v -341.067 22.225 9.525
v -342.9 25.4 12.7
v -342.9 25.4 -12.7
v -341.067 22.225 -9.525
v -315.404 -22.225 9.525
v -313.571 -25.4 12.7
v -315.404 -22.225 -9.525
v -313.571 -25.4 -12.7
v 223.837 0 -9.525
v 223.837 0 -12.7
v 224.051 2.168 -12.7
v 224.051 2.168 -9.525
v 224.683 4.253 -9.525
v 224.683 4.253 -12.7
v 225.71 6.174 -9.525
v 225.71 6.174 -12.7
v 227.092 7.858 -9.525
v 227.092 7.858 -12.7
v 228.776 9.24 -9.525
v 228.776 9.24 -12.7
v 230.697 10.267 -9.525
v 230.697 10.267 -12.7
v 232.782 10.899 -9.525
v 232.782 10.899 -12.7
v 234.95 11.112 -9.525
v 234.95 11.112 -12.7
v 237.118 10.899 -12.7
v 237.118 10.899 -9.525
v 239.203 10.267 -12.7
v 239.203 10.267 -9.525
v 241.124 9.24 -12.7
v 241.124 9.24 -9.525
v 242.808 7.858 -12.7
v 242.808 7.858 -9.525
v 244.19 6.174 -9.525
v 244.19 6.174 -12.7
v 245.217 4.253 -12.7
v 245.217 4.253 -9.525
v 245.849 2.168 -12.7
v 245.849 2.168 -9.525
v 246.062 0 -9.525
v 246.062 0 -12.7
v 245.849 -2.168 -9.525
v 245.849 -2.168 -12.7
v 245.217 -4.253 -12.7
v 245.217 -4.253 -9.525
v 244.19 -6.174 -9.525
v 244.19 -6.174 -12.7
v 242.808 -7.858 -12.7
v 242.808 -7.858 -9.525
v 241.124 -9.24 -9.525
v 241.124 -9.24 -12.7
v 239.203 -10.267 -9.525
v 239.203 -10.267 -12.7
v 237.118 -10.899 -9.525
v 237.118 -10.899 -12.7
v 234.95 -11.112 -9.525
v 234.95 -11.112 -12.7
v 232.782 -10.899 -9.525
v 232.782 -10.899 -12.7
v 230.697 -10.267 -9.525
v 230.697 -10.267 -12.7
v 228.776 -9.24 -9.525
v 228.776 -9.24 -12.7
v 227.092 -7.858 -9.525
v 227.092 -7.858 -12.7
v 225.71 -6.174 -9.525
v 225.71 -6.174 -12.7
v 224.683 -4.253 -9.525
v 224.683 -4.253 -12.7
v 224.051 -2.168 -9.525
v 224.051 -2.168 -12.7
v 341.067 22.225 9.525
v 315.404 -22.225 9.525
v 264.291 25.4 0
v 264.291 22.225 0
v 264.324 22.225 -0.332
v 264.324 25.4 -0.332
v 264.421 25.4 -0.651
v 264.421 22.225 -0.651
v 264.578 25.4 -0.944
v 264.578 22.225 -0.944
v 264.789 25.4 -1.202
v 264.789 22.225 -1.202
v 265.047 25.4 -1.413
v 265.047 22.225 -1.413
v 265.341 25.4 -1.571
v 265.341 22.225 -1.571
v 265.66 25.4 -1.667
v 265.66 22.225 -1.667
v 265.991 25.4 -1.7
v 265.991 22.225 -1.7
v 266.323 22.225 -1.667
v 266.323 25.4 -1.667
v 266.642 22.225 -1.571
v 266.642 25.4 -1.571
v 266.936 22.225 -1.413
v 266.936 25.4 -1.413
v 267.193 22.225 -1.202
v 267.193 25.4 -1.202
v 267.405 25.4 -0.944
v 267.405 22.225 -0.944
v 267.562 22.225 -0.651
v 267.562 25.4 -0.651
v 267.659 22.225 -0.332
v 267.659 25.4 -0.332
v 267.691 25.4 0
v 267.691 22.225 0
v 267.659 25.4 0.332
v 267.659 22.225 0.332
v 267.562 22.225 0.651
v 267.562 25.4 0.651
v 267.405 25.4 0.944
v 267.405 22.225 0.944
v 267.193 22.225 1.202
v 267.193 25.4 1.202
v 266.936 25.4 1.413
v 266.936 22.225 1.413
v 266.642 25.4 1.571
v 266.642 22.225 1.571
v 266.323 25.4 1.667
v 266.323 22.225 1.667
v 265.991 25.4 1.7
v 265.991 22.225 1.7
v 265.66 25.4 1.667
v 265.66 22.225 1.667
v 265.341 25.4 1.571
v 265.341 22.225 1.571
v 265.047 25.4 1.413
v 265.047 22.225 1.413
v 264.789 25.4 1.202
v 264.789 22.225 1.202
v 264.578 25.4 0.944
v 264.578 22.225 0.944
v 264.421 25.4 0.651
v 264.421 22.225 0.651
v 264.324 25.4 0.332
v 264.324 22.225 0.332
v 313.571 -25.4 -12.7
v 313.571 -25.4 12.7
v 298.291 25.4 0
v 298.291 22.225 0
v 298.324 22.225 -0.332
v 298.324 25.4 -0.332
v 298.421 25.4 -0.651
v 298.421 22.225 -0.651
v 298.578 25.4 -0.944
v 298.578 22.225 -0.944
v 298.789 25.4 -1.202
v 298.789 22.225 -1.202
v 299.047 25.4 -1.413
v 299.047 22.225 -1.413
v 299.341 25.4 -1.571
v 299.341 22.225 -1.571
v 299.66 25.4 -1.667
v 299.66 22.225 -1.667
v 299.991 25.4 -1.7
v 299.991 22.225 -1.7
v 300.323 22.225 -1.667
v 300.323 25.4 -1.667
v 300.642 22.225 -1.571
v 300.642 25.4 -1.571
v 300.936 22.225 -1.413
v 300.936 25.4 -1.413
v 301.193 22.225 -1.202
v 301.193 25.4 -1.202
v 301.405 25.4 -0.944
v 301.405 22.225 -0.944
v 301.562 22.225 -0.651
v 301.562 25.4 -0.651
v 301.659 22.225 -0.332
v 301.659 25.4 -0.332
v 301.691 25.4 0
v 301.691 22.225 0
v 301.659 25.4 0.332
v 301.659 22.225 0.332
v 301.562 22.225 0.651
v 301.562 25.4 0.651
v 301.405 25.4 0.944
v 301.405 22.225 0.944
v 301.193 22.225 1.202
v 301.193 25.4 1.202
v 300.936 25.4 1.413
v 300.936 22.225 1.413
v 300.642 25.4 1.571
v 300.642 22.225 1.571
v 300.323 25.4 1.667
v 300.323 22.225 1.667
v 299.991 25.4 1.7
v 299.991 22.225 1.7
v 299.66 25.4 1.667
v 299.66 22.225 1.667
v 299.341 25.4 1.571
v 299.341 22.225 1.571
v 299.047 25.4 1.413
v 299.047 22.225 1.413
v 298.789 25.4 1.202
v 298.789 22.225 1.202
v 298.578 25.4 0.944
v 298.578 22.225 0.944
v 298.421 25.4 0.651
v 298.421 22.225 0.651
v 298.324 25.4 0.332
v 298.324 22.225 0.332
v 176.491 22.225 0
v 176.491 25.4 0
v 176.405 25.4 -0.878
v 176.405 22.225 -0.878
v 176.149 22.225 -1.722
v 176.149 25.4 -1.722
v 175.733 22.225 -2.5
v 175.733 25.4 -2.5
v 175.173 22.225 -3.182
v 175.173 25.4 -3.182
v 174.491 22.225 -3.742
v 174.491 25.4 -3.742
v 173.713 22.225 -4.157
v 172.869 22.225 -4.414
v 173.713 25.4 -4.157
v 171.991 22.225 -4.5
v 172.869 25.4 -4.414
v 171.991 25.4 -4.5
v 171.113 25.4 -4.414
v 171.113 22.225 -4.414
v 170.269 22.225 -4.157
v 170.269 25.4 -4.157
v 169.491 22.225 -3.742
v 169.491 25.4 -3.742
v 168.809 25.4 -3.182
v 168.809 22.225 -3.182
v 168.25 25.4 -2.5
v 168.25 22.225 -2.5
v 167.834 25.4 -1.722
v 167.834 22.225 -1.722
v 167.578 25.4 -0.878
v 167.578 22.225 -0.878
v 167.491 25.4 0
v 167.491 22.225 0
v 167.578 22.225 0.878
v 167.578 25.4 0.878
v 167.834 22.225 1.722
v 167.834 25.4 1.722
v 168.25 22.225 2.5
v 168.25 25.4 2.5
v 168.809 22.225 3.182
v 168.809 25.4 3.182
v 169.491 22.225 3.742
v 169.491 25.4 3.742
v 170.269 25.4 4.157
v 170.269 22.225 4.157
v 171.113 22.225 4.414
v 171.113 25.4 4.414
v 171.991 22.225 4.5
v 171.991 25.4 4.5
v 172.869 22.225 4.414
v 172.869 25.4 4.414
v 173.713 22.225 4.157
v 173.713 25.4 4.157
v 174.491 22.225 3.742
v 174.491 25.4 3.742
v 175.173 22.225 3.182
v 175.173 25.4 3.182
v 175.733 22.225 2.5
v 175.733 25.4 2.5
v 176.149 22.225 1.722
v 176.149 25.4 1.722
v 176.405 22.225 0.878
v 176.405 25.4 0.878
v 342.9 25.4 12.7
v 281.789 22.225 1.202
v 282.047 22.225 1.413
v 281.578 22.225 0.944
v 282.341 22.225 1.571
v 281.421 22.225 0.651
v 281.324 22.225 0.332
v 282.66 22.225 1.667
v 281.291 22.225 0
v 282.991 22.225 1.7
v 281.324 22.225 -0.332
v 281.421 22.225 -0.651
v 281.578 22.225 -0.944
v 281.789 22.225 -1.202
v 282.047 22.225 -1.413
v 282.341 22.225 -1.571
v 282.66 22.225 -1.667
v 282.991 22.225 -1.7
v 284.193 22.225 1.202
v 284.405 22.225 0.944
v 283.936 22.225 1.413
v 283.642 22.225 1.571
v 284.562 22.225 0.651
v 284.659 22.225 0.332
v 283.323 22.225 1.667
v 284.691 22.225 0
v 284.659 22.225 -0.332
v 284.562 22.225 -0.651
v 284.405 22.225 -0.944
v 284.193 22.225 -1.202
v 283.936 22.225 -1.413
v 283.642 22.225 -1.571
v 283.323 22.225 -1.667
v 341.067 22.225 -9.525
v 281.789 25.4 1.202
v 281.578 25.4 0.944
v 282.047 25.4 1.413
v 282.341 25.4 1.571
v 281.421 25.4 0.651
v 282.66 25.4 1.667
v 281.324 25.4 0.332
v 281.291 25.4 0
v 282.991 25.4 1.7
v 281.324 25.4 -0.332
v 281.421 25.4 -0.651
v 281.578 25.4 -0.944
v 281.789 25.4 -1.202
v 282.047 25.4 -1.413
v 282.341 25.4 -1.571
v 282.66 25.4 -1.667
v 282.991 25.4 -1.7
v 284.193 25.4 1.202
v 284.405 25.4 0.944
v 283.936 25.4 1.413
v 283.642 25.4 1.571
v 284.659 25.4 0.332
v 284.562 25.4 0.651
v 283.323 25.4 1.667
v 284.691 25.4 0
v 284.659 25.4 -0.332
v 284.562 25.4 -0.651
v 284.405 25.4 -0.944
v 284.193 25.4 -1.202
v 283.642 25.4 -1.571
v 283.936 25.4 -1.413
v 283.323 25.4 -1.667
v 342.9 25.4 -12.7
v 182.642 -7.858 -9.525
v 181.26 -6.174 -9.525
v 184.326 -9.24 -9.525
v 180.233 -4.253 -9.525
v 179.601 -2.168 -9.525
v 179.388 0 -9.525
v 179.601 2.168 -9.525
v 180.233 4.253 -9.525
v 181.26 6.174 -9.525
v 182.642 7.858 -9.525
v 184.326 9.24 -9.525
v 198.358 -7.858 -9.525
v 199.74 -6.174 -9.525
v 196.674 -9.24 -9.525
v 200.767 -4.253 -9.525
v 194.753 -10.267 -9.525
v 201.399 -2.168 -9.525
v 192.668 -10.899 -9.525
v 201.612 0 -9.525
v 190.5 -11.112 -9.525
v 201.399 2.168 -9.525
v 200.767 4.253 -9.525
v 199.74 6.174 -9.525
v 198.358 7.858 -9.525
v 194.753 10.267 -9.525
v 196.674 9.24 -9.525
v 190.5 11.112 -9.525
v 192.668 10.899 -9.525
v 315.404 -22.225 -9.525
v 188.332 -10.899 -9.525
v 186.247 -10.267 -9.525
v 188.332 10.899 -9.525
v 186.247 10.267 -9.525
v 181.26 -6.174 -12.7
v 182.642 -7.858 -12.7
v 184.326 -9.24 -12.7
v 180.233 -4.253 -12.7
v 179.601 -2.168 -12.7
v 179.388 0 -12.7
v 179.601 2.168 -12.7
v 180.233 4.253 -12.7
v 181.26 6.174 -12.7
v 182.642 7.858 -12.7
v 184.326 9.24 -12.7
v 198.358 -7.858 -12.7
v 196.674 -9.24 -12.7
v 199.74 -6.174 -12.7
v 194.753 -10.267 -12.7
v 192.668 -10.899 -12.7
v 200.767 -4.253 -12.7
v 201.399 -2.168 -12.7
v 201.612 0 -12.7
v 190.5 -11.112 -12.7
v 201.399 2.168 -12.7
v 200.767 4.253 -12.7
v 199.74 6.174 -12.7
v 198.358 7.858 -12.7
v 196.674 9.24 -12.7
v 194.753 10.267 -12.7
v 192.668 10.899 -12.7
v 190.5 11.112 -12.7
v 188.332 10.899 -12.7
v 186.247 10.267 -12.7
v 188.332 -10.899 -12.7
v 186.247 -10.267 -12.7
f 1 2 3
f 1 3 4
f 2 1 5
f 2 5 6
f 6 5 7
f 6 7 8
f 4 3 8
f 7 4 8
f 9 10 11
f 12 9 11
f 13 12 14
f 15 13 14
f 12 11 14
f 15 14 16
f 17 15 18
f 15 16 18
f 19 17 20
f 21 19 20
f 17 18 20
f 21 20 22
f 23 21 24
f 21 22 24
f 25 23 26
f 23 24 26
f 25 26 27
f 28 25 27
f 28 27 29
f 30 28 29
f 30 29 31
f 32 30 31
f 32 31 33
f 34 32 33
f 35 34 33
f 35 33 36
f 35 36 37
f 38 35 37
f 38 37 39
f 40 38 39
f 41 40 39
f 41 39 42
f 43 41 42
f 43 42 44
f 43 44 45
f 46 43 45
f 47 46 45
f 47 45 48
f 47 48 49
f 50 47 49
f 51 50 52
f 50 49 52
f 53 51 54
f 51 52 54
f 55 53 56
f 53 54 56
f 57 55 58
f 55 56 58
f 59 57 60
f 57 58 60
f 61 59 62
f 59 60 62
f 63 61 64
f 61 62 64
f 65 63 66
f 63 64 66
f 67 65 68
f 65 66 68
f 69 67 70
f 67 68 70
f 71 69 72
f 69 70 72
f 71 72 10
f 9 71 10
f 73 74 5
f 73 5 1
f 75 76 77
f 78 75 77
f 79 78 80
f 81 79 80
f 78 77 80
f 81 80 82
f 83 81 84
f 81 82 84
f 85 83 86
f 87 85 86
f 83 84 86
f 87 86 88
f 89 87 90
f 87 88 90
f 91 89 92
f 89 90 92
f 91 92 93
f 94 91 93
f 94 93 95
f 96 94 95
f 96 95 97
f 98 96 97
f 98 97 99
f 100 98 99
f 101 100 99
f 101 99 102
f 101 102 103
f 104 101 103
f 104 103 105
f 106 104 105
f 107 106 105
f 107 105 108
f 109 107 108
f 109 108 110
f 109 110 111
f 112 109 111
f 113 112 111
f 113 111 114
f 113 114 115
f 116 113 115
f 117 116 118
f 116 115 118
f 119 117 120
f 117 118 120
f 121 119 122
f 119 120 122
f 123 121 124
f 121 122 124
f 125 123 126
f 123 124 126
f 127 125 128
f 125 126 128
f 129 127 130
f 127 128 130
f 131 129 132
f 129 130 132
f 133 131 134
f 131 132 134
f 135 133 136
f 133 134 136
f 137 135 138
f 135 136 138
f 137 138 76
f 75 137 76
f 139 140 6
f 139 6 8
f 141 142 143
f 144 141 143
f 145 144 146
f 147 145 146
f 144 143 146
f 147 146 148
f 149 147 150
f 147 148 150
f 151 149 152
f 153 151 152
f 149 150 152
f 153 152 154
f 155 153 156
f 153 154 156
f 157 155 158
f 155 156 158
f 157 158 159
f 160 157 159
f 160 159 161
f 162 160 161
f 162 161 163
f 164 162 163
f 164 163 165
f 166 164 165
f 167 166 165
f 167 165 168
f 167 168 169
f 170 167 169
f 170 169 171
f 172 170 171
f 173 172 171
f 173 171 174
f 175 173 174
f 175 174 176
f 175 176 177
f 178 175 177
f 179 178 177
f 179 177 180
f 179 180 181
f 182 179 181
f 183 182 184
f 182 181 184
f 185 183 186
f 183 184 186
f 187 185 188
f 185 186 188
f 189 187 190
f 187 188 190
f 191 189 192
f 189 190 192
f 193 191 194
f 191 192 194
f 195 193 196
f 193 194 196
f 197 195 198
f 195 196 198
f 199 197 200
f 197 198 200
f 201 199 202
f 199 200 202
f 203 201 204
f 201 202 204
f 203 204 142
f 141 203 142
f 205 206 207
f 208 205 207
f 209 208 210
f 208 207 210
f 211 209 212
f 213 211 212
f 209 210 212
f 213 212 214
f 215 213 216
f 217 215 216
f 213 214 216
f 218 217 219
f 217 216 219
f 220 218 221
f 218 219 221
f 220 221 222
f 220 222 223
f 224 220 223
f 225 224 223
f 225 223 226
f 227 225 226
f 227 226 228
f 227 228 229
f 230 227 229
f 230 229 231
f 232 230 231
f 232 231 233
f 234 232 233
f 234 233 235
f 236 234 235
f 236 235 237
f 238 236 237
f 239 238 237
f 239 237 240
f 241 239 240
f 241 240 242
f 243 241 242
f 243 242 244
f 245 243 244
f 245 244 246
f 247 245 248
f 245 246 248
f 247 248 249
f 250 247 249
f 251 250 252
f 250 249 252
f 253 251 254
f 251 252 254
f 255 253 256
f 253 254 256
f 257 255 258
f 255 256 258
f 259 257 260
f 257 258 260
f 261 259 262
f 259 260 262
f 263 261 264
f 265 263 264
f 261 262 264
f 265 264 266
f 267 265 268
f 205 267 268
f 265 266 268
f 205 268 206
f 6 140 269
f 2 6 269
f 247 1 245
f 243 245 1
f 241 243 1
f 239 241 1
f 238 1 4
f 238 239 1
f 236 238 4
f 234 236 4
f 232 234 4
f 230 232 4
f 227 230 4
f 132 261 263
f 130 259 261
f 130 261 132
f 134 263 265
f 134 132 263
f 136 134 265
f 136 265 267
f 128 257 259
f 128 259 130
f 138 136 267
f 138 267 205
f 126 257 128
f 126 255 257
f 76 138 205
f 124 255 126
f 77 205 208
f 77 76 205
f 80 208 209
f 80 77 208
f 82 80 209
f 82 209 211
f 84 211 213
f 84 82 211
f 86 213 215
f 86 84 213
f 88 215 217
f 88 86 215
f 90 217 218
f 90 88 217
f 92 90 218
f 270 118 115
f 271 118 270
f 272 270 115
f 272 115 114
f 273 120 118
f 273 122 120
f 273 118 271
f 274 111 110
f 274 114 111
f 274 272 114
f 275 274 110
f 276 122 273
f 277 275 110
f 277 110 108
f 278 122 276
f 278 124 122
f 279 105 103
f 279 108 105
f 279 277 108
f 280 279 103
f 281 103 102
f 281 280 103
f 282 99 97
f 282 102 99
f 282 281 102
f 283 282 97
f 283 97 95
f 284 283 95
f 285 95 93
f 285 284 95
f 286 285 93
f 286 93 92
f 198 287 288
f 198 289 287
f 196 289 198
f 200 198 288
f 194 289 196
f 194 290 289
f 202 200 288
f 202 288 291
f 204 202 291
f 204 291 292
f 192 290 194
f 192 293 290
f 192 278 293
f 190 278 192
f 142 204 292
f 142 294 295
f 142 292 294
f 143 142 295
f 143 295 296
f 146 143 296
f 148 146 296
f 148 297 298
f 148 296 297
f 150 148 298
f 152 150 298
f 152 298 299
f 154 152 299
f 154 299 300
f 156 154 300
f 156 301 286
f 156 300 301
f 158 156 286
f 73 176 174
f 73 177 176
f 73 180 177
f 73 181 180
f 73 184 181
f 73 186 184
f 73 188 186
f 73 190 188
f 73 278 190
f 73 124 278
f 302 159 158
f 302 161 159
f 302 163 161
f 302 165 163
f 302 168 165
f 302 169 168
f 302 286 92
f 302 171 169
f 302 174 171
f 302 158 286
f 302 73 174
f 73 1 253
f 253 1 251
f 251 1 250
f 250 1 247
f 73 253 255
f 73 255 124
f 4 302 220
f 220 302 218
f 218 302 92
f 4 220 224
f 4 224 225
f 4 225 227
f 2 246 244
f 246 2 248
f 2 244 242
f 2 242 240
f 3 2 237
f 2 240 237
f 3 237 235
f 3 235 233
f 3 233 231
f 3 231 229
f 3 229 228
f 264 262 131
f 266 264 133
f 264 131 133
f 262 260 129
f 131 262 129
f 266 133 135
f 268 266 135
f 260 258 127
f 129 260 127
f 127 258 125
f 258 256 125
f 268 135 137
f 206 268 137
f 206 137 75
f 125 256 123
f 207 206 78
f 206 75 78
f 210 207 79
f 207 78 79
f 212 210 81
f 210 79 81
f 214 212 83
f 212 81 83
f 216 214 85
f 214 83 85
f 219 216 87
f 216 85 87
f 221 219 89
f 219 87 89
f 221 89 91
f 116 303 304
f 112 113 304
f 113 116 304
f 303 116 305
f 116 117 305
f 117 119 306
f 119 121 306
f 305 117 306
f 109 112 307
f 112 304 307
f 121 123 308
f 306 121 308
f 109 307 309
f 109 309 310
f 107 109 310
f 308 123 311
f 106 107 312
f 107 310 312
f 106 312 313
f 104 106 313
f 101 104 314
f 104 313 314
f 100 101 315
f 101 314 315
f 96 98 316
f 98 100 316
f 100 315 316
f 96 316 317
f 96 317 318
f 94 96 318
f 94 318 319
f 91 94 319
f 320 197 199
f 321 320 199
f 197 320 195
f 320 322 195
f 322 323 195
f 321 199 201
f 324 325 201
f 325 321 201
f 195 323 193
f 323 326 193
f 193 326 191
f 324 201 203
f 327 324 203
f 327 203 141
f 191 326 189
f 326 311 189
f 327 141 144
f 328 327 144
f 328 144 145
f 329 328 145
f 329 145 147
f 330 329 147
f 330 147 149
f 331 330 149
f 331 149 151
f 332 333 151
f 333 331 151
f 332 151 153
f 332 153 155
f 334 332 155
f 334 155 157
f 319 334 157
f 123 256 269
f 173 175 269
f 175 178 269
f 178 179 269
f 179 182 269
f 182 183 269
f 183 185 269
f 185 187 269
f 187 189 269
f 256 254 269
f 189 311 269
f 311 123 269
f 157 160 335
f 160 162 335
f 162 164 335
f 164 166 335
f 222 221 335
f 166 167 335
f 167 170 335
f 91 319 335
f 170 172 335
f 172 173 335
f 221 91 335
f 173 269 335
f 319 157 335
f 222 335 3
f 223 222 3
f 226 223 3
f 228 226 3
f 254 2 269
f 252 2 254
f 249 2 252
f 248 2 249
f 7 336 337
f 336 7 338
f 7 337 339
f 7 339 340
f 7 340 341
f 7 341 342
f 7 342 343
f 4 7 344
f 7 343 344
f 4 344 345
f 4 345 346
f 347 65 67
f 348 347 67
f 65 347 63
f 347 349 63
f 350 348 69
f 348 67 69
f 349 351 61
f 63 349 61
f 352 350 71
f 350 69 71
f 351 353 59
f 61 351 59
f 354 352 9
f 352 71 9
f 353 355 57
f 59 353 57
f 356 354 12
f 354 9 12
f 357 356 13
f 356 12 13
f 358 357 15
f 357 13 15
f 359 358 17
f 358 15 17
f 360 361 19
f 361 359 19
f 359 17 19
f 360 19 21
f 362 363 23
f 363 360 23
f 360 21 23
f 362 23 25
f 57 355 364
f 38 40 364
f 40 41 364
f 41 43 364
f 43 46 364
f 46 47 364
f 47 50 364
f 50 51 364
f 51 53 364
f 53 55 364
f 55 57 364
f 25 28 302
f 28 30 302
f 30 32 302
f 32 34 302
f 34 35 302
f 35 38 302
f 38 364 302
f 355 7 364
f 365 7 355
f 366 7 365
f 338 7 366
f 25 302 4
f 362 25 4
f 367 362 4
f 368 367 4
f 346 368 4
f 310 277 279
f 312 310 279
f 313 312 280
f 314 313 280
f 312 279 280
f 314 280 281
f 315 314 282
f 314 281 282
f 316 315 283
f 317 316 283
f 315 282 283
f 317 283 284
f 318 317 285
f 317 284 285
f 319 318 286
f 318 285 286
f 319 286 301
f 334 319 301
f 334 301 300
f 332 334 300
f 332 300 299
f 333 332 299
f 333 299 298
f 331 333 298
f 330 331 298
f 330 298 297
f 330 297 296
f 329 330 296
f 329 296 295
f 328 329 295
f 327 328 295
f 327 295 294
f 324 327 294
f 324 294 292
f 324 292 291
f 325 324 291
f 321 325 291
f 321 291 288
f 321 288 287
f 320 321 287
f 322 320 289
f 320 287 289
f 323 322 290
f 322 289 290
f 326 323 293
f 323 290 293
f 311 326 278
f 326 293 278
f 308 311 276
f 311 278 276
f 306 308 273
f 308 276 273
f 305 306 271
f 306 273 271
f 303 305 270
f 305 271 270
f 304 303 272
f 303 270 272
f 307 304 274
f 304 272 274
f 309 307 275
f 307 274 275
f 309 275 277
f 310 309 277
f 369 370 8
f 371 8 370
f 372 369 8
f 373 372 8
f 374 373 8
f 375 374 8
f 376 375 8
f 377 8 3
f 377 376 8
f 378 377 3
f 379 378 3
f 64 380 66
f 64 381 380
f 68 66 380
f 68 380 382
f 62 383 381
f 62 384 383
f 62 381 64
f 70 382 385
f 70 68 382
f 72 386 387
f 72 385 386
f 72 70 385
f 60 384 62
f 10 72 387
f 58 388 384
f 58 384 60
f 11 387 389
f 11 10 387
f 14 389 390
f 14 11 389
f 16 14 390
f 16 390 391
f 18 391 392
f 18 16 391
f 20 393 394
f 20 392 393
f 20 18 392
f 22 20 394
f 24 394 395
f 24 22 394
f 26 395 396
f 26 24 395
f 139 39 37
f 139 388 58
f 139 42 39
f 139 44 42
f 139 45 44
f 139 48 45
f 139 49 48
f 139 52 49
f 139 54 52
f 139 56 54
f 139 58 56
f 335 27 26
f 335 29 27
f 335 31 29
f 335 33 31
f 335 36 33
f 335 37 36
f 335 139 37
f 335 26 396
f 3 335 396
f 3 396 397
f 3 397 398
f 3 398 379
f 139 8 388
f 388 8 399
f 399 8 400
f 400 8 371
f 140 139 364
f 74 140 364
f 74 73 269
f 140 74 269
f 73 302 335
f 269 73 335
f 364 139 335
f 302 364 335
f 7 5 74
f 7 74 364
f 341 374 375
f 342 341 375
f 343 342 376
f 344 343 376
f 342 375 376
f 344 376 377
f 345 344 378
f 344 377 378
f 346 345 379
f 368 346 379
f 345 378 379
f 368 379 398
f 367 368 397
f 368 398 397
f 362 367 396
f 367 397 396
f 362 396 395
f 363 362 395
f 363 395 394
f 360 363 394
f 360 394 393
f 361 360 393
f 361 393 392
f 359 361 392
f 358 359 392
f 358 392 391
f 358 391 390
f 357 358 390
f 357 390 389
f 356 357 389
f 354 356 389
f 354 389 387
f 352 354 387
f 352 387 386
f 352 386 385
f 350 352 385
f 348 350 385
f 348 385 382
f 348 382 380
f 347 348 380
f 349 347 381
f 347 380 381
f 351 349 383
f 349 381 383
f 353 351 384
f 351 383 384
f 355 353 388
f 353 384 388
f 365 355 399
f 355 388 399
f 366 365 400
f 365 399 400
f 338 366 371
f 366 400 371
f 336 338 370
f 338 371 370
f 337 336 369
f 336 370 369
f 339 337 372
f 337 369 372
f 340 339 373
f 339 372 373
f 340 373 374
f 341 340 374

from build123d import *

# Parameters (mm, degrees)
SKETCH1_W                = 25.4
SKETCH1_H                = 50.8
SKETCH1_W_2              = 19.05
SKETCH1_H_2              = 44.45
BOSS_EXTRUDE1_DEPTH      = 342.9
CUT_EXTRUDE1_DEPTH       = 1
CUT_EXTRUDE1_DEPTH_BACK  = 26.4
CUT_EXTRUDE2_REACH       = 27.4
SKETCH3_R                = 11.1125
M3_CLEARANCE_HOLE1_D     = 3.4
M3_CLEARANCE_HOLE1_DEPTH = 3.175
SKETCH9_R                = 4.5
CUT_EXTRUDE3_DEPTH       = 12.7


with BuildPart() as part:
    # Sketch1 → Boss-Extrude1 (new body, symmetric)
    with BuildSketch(Plane(origin=(0, 0, 0), x_dir=(0, 0, -1), z_dir=(1, 0, 0))):
        Rectangle(SKETCH1_W, SKETCH1_H)
        Rectangle(SKETCH1_W_2, SKETCH1_H_2, mode=Mode.SUBTRACT)
    extrude(amount=BOSS_EXTRUDE1_DEPTH, both=True)

    # Sketch2 → Cut-Extrude1 (cut, two sides)
    with BuildSketch(Plane(origin=(0, 0, -12.7), x_dir=(-1, 0, 0), z_dir=(0, 0, -1))) as cut_extrude1_sk:
        Polygon((342.9, -25.4), (342.9, 25.4), (313.570606325, -25.4), align=None)
        Polygon((-342.9, -25.4), (-313.570606325, -25.4), (-342.9, 25.4), align=None)
    extrude(amount=CUT_EXTRUDE1_DEPTH, mode=Mode.SUBTRACT)
    extrude(cut_extrude1_sk.sketch, amount=-CUT_EXTRUDE1_DEPTH_BACK, mode=Mode.SUBTRACT)

    # Sketch3 → Cut-Extrude2 (cut, up to next)
    with BuildSketch(Plane(origin=(0, 0, -12.7), x_dir=(-1, 0, 0), z_dir=(0, 0, -1)), mode=Mode.PRIVATE) as cut_extrude2_sk1:
        with Locations((-234.95, 0)):
            Circle(SKETCH3_R)
    cut_extrude2_tool1 = extrude(cut_extrude2_sk1.sketch, amount=-CUT_EXTRUDE2_REACH, mode=Mode.PRIVATE) & part.part
    add(cut_extrude2_tool1.solids().sort_by_distance((234.95, 0, -12.7))[0], mode=Mode.SUBTRACT)
    # Sketch3 → Cut-Extrude2 (cut, up to next)
    with BuildSketch(Plane(origin=(0, 0, -12.7), x_dir=(-1, 0, 0), z_dir=(0, 0, -1)), mode=Mode.PRIVATE) as cut_extrude2_sk2:
        with Locations((-190.5, 0)):
            Circle(SKETCH3_R)
    cut_extrude2_tool2 = extrude(cut_extrude2_sk2.sketch, amount=-CUT_EXTRUDE2_REACH, mode=Mode.PRIVATE) & part.part
    add(cut_extrude2_tool2.solids().sort_by_distance((190.5, 0, -12.7))[0], mode=Mode.SUBTRACT)

    # M3 Clearance Hole1
    with Locations(Plane(origin=(0, 25.4, 0), x_dir=(1, 0, 0), z_dir=(0, 1, 0))):
        with Locations((299.991366478, 0), (282.991366478, 0), (265.991366478, 0)):
            Hole(M3_CLEARANCE_HOLE1_D / 2, depth=M3_CLEARANCE_HOLE1_DEPTH)

    # Sketch9 → Cut-Extrude3 (cut)
    with BuildSketch(Plane(origin=(0, 25.4, 0), x_dir=(1, 0, 0), z_dir=(0, 1, 0))):
        with Locations((171.991366478, 0)):
            Circle(SKETCH9_R)
    extrude(amount=-CUT_EXTRUDE3_DEPTH, mode=Mode.SUBTRACT)


solid = part.part
